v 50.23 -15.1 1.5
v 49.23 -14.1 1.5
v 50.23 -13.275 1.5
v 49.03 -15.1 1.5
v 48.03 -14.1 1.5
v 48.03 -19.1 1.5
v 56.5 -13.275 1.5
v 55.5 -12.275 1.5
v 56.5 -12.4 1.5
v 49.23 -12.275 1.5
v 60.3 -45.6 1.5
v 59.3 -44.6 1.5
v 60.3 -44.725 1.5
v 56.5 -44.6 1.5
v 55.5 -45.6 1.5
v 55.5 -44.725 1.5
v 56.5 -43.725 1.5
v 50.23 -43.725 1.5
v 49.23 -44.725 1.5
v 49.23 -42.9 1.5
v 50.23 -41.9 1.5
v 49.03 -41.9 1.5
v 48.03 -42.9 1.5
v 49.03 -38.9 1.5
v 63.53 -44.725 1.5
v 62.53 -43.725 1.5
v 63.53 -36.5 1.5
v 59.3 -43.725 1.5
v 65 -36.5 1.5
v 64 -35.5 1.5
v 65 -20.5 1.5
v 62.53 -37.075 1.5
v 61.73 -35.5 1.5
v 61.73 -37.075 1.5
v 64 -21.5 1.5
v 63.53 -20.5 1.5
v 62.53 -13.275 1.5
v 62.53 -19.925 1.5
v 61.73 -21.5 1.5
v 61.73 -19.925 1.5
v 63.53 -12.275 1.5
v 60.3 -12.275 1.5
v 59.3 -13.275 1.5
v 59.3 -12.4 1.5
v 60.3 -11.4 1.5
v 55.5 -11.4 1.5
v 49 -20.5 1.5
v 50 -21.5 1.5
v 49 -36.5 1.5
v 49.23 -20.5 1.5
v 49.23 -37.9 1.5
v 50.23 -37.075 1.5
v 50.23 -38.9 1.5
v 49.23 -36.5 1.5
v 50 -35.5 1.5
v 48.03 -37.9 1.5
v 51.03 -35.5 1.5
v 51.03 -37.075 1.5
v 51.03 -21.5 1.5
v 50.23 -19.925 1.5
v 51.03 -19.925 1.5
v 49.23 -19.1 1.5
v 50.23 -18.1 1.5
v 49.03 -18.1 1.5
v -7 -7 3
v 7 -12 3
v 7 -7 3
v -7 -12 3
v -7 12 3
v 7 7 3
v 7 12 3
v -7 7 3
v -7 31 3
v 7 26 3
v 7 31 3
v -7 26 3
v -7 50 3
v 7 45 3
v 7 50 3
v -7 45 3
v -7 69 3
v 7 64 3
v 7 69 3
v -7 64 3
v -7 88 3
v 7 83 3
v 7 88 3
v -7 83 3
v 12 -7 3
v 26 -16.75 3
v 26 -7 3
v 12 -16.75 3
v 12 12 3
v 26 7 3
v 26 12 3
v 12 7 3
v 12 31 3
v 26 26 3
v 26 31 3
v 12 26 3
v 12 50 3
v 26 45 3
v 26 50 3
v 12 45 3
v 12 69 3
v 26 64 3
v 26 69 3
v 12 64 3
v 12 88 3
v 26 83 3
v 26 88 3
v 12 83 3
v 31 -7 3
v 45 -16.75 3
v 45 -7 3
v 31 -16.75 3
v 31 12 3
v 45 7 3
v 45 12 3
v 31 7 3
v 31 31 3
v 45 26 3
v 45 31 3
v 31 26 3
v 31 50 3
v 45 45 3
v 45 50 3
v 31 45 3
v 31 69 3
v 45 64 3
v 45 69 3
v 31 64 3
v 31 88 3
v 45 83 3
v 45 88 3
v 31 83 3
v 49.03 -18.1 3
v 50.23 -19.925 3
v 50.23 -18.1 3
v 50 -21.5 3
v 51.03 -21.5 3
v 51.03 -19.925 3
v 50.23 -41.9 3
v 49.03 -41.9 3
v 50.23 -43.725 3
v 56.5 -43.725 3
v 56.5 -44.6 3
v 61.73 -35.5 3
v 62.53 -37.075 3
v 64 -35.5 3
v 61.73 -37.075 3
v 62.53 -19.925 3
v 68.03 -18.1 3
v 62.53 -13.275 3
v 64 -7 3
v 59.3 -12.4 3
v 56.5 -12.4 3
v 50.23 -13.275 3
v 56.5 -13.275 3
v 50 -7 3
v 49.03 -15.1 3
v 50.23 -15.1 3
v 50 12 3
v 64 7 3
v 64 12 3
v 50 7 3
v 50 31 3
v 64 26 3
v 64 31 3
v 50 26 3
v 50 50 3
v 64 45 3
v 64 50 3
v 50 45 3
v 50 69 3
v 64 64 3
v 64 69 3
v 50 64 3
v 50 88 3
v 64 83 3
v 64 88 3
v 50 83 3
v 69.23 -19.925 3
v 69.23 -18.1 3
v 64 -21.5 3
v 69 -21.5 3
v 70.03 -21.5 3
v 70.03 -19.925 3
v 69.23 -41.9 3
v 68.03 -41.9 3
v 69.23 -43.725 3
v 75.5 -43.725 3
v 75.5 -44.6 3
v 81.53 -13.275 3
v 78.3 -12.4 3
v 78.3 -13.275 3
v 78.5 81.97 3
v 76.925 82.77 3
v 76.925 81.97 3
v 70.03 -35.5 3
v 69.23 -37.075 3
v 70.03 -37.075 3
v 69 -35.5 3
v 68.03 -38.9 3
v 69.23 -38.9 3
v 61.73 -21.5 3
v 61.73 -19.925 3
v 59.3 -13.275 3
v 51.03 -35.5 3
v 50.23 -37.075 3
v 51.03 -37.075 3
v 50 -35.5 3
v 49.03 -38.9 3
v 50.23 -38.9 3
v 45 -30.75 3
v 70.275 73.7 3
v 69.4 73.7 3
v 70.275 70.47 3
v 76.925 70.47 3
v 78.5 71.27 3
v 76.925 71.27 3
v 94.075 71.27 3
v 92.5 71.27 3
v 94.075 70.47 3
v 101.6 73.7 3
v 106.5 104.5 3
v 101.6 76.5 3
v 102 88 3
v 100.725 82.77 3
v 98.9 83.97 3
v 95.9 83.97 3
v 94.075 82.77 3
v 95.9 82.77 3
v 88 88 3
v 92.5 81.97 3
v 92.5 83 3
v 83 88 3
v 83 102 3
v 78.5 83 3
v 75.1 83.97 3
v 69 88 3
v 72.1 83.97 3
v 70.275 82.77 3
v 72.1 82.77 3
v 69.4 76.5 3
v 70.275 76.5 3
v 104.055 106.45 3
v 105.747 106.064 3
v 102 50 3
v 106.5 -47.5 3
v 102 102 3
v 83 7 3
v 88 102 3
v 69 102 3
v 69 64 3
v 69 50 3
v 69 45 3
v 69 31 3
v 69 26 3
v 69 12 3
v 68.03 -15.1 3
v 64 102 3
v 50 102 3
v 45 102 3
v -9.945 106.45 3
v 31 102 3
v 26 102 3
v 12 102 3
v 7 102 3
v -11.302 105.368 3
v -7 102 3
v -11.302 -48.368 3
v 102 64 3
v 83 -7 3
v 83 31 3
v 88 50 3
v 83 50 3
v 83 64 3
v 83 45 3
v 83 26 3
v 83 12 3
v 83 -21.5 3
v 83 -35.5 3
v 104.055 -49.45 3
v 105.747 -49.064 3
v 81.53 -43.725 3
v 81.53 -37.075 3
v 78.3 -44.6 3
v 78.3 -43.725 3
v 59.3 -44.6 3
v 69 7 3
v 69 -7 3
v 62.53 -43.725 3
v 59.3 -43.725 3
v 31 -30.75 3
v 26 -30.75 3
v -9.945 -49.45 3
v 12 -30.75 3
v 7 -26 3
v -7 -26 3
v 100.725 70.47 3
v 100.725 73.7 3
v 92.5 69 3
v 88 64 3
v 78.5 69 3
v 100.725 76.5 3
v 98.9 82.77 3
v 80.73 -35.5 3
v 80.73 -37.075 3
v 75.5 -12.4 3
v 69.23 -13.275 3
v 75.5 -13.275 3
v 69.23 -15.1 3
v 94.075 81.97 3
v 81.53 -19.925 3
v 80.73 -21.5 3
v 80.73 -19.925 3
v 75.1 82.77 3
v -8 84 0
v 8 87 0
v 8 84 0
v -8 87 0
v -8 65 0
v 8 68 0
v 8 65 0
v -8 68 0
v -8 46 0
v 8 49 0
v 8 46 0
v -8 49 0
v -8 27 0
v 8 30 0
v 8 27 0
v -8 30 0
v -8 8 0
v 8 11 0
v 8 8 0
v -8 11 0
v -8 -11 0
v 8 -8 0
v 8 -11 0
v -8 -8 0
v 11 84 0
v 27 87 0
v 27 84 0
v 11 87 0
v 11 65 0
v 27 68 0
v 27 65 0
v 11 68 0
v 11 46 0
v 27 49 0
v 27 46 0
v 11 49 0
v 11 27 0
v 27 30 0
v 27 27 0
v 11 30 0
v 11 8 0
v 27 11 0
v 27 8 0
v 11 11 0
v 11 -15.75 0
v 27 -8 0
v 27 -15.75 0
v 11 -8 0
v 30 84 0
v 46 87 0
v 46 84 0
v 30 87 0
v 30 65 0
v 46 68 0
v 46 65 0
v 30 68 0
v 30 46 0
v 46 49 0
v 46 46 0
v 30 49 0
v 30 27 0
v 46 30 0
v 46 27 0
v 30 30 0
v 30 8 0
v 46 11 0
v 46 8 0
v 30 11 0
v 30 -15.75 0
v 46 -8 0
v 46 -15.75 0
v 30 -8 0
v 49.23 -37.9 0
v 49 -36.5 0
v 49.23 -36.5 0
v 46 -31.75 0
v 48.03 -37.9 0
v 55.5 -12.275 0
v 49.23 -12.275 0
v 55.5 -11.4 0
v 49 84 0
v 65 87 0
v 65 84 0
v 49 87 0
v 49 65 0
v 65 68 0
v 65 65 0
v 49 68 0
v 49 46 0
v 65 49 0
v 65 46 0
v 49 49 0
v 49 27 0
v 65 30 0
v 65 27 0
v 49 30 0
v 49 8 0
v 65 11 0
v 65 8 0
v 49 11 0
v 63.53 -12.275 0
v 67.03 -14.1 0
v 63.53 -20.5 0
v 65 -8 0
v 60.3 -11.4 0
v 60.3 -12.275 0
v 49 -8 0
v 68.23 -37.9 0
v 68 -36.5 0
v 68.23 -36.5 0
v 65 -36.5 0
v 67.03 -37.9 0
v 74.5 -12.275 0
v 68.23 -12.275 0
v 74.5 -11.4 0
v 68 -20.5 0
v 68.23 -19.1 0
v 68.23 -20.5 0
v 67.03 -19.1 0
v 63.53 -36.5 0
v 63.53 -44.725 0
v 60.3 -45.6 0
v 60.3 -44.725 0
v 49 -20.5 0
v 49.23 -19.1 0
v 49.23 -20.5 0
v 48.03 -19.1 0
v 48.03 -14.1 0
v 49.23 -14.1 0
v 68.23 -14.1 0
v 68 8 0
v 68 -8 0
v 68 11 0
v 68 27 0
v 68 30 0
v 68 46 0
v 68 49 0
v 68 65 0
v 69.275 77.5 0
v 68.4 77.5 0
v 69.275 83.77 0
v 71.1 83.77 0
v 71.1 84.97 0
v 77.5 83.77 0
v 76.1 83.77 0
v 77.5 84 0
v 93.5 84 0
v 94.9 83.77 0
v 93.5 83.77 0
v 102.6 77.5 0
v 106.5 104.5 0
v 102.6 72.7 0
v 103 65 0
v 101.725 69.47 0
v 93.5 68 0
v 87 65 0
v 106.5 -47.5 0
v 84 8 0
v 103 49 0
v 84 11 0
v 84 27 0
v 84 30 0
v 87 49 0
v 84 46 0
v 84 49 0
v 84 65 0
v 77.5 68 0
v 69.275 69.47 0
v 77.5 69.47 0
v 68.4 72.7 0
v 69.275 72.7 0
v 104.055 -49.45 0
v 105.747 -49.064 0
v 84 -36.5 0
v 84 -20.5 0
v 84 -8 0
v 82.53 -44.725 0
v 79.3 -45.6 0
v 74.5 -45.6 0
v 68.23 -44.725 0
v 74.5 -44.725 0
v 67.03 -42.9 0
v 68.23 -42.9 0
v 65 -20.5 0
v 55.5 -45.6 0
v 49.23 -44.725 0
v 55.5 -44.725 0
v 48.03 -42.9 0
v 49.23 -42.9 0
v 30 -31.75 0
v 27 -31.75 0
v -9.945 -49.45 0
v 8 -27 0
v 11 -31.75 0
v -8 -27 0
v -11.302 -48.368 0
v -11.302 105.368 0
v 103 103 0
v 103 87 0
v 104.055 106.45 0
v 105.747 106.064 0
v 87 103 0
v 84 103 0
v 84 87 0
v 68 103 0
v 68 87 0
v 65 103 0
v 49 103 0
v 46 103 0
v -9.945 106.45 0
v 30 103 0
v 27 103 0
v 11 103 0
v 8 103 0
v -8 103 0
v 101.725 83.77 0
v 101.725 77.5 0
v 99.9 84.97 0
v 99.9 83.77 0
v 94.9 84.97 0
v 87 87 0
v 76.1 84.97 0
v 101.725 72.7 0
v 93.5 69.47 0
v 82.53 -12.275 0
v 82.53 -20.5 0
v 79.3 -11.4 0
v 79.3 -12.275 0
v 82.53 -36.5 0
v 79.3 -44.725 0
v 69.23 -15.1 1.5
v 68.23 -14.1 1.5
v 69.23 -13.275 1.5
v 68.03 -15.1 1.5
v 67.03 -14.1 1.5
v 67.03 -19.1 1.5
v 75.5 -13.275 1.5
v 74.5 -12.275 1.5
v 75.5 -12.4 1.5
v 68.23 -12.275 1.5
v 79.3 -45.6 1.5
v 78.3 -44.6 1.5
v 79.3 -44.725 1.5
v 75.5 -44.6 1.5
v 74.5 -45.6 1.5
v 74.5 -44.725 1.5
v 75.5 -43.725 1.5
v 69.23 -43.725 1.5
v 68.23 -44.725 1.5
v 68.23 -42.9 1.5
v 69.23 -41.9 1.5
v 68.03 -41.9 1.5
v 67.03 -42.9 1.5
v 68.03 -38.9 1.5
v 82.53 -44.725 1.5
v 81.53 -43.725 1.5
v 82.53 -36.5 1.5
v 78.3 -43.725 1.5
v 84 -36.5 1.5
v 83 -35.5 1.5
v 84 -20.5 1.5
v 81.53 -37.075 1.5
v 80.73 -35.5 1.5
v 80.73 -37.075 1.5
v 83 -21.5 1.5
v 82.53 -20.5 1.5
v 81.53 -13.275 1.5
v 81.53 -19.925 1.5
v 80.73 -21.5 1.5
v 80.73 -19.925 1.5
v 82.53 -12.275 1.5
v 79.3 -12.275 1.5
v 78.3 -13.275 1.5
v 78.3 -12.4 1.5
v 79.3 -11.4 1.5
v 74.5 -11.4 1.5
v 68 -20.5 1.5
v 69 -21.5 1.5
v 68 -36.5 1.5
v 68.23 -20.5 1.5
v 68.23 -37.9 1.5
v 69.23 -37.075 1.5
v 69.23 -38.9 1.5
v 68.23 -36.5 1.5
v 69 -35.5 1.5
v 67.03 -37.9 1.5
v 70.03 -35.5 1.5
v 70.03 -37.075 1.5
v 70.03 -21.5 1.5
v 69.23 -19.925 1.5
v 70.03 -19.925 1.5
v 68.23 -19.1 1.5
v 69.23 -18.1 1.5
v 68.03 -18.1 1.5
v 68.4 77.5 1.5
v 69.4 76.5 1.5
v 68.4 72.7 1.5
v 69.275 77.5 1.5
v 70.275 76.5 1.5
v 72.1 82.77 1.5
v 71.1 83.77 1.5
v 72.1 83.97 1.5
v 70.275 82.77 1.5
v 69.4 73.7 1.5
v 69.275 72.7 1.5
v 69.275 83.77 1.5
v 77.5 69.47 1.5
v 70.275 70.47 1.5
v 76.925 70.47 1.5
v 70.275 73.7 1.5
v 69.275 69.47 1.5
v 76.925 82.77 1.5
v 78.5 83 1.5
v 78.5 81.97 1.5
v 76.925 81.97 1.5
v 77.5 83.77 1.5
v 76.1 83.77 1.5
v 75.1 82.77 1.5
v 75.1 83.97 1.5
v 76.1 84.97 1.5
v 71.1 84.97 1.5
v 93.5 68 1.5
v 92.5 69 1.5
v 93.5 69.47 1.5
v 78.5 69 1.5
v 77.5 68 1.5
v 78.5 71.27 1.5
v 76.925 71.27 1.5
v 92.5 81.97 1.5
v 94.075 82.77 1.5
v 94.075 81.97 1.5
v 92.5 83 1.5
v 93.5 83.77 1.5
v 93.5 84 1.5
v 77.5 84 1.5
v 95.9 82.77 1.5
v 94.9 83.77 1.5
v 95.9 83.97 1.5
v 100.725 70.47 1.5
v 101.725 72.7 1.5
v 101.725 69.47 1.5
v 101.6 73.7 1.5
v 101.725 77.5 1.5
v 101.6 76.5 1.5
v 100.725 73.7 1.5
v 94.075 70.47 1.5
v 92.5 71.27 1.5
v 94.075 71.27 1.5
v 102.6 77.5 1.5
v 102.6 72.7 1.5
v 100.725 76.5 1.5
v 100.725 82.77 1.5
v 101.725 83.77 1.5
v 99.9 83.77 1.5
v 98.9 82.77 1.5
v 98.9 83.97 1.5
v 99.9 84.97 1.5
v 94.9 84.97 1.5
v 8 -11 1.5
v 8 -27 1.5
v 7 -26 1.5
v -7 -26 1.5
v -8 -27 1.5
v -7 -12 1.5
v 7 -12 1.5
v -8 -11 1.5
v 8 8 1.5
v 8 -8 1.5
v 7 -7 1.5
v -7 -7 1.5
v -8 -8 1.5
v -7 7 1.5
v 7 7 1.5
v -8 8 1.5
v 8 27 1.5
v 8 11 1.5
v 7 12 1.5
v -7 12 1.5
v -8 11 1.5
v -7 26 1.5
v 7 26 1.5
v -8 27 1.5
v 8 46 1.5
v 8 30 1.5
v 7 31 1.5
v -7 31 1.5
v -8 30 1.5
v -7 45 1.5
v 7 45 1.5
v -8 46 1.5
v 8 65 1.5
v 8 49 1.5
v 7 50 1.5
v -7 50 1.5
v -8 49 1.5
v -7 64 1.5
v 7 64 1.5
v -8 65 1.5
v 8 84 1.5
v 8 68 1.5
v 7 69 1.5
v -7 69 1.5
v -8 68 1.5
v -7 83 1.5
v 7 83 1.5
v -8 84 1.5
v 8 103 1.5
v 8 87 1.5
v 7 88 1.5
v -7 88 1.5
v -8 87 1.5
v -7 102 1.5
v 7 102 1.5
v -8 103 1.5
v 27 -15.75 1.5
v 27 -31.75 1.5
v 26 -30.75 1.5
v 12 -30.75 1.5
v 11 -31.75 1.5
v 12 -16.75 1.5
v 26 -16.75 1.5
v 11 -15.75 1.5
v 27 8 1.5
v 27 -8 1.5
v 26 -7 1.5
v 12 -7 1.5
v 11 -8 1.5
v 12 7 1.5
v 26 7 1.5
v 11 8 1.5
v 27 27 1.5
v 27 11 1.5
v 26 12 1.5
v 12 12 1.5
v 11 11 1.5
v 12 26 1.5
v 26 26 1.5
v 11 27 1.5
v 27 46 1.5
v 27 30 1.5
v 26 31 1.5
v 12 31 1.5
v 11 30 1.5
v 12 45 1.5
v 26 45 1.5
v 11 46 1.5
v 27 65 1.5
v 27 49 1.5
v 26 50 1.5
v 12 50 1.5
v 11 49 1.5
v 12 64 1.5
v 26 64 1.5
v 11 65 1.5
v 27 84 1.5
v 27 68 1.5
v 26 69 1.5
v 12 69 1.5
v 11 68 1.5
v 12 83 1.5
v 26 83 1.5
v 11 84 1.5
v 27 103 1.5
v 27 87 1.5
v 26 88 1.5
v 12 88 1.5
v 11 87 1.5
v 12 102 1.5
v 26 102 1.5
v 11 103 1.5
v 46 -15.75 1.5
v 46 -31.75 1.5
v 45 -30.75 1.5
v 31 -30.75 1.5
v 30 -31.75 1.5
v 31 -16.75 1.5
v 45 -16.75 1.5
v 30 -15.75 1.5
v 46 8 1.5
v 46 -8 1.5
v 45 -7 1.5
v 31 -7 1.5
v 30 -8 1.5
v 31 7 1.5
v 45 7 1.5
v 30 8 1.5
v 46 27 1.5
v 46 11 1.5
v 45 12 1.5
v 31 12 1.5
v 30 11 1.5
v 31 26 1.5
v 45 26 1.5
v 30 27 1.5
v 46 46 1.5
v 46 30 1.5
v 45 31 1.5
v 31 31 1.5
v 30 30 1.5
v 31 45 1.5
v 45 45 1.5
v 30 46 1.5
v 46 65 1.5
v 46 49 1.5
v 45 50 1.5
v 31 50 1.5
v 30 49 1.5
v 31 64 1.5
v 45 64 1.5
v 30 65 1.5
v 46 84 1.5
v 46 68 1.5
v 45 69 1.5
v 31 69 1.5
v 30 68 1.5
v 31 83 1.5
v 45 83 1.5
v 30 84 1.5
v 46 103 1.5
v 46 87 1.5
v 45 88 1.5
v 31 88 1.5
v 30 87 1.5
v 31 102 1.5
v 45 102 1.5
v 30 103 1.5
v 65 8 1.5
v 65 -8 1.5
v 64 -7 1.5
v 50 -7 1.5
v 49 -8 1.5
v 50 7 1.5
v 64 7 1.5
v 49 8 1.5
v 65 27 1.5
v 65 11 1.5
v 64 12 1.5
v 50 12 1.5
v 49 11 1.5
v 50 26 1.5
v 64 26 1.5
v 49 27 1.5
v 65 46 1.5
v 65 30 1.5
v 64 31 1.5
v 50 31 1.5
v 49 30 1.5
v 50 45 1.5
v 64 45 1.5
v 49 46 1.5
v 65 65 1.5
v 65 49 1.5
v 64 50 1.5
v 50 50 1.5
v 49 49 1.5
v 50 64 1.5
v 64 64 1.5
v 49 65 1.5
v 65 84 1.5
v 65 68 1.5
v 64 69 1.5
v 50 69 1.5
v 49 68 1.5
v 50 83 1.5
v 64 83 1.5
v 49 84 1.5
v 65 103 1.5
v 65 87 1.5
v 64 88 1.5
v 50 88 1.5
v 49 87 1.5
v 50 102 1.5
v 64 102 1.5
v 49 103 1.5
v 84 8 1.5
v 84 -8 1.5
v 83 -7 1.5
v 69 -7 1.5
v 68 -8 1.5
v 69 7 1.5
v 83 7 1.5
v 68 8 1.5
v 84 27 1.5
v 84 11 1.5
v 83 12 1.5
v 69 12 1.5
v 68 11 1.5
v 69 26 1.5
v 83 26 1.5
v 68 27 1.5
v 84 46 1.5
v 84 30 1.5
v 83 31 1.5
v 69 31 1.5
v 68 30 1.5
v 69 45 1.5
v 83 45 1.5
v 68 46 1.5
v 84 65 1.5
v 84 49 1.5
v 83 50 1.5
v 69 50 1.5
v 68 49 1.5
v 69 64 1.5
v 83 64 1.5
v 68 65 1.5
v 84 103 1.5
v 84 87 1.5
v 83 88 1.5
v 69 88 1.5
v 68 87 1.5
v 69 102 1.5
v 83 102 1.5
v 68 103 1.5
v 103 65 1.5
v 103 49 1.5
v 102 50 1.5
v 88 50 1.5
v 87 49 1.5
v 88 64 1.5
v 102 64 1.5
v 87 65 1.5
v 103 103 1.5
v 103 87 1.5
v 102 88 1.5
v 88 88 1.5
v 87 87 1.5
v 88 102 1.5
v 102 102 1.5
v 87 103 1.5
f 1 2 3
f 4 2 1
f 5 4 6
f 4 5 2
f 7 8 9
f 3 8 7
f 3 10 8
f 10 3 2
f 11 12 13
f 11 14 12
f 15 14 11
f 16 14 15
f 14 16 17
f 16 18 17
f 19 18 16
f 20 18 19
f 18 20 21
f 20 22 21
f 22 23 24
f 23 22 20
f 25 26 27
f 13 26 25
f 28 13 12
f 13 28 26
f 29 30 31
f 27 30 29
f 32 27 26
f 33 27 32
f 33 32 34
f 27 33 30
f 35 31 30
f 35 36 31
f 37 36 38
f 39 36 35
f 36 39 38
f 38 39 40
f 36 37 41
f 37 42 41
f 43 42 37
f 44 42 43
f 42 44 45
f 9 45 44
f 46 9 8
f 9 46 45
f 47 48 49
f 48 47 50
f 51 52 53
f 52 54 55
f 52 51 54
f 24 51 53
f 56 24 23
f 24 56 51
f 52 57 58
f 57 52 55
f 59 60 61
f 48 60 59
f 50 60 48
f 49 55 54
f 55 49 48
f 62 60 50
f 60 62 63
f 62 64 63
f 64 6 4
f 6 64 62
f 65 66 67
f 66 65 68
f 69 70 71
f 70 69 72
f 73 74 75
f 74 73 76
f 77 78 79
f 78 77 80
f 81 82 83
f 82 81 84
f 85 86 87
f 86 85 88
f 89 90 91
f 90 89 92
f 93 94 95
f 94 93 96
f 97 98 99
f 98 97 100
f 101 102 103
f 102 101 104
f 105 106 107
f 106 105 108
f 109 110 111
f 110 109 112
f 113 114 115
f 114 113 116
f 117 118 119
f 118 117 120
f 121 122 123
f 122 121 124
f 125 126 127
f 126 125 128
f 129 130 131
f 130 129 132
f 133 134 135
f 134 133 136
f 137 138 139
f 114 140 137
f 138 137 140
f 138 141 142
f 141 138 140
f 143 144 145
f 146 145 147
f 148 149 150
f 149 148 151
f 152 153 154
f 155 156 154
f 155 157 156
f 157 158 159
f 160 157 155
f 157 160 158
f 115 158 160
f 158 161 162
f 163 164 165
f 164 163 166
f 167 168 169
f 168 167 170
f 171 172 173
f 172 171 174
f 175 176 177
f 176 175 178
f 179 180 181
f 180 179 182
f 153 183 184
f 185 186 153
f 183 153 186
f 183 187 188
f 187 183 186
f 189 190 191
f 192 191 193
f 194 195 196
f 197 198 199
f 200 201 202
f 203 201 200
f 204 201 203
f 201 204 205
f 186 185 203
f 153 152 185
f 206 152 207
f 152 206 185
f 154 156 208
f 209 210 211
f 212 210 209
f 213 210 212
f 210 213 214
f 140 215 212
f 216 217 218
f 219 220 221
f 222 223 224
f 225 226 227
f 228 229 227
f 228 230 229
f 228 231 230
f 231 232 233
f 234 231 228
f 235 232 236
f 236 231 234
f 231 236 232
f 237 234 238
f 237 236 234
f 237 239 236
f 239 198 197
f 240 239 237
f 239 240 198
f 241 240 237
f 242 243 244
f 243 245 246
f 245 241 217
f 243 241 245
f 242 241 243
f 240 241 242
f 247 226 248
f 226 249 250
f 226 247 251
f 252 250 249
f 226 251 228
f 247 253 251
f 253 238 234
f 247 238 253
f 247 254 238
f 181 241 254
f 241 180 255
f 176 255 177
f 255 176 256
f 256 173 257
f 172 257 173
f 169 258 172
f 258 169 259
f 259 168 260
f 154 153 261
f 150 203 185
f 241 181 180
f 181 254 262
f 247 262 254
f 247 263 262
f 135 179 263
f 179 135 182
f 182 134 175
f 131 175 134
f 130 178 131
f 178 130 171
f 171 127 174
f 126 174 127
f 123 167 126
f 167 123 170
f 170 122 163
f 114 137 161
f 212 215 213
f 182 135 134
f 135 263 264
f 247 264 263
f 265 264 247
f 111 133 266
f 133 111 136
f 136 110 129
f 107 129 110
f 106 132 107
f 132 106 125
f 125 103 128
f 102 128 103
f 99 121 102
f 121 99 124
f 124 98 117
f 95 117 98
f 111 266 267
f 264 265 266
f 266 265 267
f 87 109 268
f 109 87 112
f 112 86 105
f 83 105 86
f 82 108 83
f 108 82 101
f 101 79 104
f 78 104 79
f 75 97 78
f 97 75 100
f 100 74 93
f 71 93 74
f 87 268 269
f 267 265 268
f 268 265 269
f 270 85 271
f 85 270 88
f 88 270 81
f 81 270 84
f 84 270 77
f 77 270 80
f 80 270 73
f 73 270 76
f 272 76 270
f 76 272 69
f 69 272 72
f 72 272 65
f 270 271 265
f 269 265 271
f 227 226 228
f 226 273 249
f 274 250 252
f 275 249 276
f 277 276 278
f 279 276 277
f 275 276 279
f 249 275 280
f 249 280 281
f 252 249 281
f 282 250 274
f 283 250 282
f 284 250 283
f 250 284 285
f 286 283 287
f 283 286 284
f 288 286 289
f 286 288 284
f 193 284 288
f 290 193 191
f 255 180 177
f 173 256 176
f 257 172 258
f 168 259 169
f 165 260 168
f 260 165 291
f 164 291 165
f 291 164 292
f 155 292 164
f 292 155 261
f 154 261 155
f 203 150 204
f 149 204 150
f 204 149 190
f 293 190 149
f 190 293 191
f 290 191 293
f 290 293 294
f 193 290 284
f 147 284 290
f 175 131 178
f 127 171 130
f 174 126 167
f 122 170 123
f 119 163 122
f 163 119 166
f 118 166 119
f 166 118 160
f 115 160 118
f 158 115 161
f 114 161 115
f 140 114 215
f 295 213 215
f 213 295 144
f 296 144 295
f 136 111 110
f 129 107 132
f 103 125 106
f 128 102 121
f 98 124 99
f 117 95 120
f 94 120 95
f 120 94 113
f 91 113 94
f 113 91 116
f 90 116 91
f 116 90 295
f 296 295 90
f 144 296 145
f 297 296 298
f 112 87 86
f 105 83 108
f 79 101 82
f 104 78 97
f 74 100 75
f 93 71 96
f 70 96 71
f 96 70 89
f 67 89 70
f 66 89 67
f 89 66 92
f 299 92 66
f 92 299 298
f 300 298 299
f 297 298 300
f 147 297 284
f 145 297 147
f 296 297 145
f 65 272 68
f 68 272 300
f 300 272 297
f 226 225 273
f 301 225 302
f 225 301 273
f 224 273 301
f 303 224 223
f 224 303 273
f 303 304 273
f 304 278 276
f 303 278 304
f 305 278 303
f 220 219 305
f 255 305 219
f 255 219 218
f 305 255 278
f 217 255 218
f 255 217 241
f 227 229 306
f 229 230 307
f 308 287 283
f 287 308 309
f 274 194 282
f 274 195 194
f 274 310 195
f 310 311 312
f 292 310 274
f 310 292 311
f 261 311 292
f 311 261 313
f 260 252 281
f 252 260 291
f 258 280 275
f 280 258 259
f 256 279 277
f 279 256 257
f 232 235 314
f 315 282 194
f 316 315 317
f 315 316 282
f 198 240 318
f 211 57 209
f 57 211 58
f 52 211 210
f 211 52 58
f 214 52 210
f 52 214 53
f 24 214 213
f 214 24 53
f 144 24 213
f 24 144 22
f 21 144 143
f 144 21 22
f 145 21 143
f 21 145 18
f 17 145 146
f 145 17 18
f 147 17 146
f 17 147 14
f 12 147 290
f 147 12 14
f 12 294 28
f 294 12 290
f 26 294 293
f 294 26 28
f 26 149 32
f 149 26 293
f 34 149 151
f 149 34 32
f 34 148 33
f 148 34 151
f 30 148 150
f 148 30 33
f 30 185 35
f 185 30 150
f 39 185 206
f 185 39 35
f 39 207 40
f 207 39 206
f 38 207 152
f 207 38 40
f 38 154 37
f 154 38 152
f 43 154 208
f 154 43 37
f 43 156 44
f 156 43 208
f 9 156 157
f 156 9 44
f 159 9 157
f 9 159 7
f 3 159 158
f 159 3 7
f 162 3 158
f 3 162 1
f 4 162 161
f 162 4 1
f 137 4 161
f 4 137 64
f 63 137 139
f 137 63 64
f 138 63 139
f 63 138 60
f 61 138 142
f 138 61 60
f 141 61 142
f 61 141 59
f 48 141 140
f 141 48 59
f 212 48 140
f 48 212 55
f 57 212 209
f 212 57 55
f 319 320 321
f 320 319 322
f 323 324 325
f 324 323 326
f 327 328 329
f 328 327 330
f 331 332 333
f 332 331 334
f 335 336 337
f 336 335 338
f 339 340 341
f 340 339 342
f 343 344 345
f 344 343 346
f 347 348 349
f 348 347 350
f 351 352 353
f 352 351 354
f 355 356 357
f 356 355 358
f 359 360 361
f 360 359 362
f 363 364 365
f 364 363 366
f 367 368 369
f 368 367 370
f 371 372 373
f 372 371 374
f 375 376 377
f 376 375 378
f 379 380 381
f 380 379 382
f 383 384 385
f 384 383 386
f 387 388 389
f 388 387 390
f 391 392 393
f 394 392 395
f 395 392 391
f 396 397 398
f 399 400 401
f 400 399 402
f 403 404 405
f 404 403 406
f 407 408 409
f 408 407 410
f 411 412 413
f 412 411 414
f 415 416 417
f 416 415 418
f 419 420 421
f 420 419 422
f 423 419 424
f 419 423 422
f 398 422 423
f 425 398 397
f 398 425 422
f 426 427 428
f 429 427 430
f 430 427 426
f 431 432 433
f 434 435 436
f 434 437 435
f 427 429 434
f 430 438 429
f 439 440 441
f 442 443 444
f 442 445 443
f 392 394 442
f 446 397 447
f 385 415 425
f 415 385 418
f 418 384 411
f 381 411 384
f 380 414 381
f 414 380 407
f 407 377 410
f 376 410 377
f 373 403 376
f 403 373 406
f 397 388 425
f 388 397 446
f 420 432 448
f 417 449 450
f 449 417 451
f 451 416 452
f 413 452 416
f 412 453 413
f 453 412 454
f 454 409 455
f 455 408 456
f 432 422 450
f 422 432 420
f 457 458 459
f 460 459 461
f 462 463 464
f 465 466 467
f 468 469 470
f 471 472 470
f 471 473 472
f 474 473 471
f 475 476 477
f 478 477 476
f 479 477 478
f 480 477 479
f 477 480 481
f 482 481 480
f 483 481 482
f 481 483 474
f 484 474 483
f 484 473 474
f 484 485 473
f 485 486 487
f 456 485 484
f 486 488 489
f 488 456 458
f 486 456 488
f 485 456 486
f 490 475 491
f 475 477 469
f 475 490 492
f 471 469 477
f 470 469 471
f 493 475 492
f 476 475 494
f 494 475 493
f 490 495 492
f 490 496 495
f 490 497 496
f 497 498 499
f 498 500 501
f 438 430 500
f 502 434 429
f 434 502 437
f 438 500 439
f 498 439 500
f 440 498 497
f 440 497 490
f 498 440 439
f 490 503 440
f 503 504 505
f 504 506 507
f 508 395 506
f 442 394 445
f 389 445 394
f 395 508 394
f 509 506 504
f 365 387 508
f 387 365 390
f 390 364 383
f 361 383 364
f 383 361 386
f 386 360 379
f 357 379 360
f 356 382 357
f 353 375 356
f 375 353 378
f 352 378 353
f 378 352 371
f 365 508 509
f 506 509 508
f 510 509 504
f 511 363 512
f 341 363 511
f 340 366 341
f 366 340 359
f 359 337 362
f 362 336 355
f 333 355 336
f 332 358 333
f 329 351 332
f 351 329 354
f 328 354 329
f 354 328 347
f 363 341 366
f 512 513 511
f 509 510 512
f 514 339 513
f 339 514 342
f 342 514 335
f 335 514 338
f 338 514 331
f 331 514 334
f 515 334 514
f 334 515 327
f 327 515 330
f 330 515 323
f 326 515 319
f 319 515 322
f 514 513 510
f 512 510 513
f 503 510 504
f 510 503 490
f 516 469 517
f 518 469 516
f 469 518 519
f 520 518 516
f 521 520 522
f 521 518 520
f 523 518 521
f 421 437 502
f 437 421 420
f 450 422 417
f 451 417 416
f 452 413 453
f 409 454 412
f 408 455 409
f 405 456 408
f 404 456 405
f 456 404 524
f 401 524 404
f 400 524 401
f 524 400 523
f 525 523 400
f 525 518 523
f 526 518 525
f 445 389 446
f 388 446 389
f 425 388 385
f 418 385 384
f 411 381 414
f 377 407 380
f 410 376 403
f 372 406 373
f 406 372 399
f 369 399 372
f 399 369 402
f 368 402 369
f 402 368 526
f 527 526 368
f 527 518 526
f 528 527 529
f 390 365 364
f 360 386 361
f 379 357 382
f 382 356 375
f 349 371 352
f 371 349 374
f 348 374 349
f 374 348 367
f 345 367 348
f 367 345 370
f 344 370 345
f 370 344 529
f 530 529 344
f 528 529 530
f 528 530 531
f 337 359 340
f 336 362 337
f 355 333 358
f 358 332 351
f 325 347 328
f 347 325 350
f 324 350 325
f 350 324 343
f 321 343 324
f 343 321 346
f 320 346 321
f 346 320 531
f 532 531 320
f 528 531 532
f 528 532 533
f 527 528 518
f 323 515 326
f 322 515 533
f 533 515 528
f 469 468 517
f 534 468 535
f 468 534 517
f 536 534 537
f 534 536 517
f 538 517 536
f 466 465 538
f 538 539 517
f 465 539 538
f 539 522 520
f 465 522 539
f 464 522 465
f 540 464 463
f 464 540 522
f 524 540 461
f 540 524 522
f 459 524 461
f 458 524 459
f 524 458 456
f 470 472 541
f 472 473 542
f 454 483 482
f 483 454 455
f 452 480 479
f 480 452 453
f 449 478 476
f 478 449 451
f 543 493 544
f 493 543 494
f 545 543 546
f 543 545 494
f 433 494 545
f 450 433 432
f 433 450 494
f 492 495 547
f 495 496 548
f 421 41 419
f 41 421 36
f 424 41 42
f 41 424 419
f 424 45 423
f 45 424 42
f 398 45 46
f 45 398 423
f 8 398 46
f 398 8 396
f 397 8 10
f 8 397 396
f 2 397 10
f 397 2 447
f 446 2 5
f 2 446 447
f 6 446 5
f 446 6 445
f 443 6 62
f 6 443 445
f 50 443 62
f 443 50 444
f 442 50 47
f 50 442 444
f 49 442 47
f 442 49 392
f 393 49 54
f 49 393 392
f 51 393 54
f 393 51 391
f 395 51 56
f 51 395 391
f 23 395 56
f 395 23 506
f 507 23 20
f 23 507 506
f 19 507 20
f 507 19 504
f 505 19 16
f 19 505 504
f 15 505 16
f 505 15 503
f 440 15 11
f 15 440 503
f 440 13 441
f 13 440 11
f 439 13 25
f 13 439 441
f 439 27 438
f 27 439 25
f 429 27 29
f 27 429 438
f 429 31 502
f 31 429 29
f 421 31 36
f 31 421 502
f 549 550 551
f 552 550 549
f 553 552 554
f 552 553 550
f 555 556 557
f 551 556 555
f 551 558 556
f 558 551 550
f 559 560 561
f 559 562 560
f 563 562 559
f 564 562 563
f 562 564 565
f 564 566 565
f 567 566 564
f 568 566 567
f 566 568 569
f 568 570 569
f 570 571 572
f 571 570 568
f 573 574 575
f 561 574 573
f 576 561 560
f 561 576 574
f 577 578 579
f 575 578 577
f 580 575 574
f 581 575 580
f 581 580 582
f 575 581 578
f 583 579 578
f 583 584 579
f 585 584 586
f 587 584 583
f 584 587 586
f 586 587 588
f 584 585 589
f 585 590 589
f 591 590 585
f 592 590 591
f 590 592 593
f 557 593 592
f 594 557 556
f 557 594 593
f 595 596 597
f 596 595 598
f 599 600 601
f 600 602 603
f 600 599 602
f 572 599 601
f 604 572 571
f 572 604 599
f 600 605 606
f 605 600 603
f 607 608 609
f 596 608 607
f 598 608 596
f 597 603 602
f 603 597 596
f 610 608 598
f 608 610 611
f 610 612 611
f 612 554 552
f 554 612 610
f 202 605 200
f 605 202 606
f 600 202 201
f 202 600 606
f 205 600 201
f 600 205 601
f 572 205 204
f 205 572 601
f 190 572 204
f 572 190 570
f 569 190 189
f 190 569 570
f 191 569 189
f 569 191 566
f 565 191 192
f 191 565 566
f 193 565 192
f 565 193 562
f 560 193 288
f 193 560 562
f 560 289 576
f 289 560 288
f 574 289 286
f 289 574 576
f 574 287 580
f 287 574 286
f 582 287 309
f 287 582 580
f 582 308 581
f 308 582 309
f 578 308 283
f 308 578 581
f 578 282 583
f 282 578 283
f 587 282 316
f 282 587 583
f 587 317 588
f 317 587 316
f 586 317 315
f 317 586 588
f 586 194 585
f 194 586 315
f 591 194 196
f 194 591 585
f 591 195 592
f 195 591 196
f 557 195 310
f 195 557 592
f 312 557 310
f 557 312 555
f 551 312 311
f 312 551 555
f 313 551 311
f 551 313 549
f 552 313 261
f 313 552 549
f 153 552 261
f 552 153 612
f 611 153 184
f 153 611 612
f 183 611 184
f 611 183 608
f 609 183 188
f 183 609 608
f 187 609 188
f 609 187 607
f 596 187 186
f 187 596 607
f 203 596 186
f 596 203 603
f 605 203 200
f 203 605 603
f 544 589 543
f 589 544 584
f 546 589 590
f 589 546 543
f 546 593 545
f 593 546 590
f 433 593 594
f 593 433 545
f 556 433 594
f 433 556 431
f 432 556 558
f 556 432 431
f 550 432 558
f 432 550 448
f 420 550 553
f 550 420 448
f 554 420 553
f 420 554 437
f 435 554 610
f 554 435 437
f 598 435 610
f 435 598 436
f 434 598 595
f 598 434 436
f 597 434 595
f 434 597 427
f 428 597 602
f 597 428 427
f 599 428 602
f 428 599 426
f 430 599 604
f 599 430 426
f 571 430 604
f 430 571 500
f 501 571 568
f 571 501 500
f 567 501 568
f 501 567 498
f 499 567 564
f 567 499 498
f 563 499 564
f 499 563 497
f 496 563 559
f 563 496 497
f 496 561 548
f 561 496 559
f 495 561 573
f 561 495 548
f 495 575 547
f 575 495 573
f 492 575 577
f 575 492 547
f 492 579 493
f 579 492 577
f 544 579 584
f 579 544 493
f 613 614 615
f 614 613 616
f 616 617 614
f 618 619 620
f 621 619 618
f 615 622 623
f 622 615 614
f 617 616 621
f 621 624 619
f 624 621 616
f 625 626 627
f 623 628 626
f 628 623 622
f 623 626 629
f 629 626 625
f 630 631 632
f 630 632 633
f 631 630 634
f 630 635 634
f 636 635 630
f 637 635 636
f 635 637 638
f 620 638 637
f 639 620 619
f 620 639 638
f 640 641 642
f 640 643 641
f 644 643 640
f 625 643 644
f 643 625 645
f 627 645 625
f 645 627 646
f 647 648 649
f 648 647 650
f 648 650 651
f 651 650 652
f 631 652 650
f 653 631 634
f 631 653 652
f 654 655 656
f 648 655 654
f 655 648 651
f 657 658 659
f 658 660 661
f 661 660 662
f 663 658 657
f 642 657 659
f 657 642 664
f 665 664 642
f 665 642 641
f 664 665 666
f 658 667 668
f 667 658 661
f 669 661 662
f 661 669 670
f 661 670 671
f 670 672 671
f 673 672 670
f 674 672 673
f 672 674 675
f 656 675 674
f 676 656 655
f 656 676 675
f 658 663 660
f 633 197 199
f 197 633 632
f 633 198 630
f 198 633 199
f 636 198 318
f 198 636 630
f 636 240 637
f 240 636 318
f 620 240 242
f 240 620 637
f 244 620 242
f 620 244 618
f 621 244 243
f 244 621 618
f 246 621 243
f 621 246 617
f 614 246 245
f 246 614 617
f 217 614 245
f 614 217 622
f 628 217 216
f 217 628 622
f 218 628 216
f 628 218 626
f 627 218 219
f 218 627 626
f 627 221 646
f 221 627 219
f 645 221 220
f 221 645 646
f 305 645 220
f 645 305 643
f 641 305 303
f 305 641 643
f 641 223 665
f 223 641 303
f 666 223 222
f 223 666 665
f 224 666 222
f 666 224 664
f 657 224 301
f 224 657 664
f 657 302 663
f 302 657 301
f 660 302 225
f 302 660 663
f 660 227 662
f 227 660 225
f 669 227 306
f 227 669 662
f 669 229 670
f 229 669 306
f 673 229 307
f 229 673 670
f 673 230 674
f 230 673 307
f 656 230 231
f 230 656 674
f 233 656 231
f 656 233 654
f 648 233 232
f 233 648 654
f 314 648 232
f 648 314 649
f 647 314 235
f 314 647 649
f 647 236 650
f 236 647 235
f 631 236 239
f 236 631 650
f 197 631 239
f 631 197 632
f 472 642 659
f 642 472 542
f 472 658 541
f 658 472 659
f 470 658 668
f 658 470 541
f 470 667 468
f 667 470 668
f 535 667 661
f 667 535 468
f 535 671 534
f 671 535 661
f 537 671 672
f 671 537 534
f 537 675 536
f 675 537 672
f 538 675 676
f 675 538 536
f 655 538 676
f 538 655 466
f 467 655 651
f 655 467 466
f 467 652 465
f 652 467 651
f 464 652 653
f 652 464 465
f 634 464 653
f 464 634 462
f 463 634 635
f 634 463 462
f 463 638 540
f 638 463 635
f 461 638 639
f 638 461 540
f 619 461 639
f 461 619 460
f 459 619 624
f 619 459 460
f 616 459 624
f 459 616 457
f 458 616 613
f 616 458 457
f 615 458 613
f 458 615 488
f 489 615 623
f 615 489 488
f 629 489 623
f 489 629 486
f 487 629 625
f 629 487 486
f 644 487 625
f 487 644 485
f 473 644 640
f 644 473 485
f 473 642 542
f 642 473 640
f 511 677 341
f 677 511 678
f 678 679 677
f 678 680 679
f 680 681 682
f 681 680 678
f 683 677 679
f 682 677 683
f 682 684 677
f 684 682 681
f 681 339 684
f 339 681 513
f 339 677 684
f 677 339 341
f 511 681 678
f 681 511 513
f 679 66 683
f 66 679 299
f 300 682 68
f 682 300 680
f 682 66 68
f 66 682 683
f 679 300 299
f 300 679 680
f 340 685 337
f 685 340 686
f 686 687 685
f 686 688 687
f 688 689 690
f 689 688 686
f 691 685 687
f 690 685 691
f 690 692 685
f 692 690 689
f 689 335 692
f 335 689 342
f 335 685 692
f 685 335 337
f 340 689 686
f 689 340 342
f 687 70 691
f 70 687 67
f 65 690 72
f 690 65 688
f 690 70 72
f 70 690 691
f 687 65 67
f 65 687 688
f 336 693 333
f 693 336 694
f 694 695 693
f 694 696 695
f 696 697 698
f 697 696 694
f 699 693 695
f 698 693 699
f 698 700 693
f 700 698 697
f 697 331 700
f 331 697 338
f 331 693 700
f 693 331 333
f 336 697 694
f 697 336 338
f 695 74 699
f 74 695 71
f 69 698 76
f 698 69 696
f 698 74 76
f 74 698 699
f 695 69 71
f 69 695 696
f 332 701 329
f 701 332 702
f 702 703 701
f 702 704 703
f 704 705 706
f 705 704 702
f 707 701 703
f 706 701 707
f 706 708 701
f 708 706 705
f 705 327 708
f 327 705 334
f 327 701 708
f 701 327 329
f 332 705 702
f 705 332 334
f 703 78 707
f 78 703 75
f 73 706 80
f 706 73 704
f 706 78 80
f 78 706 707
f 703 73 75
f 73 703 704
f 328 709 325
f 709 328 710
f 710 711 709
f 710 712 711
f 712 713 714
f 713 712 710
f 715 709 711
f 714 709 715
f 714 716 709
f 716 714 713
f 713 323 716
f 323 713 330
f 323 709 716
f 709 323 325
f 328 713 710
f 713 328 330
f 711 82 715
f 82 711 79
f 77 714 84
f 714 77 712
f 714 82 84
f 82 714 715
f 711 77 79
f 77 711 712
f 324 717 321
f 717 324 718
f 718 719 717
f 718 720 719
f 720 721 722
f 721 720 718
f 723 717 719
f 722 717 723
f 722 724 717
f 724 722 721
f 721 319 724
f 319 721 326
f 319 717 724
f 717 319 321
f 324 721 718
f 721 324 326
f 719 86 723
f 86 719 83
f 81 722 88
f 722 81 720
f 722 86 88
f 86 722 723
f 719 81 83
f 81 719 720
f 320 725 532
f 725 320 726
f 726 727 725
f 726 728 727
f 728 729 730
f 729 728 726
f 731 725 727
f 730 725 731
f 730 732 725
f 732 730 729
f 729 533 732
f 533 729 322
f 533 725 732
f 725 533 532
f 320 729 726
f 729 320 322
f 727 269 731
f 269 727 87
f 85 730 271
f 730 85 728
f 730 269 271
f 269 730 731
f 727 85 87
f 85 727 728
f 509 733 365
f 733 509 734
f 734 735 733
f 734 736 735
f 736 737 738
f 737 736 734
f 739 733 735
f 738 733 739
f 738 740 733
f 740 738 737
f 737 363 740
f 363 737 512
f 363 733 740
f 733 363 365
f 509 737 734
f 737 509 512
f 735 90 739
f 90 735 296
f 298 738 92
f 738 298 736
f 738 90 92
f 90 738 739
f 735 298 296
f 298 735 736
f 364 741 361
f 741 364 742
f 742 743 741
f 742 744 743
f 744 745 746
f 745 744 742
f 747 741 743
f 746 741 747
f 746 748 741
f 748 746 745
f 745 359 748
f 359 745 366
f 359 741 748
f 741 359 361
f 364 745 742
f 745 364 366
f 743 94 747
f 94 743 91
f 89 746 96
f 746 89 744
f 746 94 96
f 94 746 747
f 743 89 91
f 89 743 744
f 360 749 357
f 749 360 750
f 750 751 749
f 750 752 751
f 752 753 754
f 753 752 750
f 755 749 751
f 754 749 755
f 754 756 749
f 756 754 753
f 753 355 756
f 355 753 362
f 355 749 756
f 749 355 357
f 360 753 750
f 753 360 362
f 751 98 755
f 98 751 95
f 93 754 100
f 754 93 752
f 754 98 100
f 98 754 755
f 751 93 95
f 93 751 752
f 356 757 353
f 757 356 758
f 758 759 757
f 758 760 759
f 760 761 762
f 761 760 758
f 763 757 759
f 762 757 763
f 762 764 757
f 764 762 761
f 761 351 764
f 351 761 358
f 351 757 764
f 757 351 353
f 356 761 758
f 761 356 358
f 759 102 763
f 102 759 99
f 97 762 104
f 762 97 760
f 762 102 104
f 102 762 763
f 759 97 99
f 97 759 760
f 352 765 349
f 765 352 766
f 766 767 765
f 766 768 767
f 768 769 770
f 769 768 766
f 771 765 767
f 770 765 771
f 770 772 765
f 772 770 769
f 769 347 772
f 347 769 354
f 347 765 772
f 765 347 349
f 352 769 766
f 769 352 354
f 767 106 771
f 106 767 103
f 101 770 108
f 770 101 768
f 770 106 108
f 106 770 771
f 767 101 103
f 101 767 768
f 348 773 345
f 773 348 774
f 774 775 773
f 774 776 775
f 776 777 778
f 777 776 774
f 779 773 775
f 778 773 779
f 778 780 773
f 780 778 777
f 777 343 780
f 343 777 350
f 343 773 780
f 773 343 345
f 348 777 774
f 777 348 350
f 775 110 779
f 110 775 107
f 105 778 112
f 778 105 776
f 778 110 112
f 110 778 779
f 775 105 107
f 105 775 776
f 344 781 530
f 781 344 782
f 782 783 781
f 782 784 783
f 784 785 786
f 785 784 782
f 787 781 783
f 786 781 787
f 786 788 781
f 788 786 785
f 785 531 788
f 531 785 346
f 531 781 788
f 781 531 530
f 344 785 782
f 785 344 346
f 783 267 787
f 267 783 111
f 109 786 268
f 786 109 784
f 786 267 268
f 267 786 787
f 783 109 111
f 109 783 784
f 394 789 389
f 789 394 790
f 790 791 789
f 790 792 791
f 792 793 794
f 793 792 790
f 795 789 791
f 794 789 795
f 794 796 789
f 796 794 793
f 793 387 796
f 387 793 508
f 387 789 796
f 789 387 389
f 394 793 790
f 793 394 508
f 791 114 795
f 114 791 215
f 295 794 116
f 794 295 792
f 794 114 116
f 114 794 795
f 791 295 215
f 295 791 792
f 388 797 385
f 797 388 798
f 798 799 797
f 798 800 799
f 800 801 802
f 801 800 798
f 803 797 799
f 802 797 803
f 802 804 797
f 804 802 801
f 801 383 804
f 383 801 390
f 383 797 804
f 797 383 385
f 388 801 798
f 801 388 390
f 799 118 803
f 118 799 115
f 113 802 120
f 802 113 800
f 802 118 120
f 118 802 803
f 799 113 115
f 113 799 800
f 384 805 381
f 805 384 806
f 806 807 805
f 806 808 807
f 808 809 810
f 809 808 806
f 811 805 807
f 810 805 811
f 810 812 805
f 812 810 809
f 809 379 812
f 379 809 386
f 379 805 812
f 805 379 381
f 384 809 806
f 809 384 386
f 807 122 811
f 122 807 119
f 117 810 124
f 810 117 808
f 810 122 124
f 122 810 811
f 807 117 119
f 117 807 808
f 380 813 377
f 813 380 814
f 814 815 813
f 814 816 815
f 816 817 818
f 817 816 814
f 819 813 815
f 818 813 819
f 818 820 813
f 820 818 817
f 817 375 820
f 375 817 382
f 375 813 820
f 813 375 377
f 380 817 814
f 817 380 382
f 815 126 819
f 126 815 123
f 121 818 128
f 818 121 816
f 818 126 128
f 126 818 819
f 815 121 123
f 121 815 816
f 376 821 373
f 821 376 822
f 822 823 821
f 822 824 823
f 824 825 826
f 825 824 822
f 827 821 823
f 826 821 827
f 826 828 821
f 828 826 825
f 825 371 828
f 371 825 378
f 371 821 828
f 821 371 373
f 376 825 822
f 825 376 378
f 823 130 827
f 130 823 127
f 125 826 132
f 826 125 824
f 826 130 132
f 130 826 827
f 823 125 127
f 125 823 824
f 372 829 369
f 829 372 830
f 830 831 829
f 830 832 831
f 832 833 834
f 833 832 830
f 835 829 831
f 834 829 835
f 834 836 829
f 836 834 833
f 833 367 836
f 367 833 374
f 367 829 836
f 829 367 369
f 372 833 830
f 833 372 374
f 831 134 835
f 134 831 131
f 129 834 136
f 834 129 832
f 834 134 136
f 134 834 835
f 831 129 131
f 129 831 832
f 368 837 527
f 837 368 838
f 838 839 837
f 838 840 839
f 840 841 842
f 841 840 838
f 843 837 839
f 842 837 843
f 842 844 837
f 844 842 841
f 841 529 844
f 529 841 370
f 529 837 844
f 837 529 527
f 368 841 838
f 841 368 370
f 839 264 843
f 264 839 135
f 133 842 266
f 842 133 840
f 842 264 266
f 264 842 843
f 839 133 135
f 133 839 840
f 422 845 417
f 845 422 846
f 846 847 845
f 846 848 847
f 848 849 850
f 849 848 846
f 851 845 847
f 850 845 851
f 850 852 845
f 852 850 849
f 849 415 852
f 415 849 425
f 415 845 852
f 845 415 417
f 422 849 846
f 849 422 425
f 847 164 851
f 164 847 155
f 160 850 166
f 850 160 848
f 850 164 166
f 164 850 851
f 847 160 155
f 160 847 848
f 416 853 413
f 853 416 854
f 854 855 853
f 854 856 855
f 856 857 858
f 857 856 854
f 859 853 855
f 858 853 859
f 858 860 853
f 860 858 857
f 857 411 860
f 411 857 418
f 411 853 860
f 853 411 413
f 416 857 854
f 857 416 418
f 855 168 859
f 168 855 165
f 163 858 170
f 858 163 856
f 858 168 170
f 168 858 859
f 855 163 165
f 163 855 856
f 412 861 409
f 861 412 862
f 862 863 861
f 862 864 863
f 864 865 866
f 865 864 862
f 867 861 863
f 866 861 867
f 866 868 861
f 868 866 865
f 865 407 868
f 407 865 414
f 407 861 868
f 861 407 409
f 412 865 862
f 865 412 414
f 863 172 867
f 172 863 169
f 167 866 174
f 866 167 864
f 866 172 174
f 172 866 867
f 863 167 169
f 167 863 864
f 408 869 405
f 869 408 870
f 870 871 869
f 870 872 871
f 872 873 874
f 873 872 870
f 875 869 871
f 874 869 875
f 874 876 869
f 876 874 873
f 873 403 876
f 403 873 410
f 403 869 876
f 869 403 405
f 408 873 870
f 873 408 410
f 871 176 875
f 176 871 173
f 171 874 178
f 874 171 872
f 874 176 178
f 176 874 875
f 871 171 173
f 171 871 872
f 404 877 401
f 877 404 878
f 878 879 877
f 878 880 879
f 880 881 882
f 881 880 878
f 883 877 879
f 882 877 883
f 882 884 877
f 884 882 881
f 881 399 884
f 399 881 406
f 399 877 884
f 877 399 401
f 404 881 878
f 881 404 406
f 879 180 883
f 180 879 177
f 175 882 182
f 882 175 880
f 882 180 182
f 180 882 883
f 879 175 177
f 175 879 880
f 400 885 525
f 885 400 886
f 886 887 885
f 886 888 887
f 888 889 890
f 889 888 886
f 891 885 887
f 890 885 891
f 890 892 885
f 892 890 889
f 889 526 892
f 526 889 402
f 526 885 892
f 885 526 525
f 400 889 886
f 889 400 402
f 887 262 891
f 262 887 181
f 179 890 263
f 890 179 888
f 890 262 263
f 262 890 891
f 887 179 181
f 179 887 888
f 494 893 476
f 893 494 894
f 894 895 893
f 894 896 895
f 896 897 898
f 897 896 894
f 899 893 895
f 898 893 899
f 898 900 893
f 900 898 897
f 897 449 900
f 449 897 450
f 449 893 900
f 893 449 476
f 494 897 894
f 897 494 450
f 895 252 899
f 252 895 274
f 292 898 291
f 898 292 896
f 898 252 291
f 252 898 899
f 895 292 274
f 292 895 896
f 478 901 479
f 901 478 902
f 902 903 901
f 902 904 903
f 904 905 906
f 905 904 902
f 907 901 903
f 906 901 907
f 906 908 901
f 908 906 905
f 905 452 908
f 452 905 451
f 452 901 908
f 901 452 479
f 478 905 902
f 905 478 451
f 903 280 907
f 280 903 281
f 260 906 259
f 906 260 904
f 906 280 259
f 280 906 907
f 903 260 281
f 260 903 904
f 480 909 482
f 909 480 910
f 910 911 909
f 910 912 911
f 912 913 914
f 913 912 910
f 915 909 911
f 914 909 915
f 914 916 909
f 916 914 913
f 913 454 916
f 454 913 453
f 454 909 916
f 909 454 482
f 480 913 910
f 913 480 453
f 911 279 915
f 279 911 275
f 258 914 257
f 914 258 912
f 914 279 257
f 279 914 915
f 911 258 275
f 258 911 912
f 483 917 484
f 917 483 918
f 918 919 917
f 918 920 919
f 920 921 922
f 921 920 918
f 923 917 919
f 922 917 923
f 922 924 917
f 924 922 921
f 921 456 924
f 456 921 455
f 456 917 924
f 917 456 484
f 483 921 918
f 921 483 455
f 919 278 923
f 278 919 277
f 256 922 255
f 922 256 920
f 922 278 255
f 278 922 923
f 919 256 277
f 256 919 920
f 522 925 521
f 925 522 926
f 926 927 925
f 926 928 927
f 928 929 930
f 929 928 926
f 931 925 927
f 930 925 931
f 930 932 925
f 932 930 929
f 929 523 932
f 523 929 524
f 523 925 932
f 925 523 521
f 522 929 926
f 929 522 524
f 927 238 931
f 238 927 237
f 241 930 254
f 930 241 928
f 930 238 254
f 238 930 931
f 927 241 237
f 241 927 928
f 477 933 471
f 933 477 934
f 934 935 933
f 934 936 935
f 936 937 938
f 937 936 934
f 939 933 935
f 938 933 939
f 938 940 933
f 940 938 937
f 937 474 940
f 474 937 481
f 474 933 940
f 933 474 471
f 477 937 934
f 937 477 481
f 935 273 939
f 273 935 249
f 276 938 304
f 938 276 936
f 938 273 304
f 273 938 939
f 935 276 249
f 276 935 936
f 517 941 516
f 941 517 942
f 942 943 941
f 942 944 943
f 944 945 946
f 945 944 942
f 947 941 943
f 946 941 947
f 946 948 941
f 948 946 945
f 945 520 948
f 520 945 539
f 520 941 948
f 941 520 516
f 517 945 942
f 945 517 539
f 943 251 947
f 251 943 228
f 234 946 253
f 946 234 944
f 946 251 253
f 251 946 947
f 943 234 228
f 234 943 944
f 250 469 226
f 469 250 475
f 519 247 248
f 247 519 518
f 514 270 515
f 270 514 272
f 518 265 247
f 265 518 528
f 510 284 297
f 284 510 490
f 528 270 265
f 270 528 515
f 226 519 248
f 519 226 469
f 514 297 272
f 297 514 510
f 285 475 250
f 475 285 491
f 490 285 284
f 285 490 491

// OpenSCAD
slop = 0.0;
switch_x = 14 + slop;
switch_y = switch_x;
rounding = 2;

plate_thickness = 3;

//clip_thickness = 1.524 + slop; //mx
clip_thickness = 1.5 + slop; //gateron

outer_padding = 5;
hole_size = 4;

case_height=12;

pitch = 19;
u = pitch;

switch_positions = [
                    //row1
                    [0,-1*u,0],
                    [0,0,0],
                    [0,1*u,0],
                    [0,2*u,0],
                    [0,3*u,0],
                    [0,4*u,0],
                    [0,5*u,0],
                    //row2
                    [1*u,-1.25*u,0],
                    [1*u,0,0],
                    [1*u,1*u,0],
                    [1*u,2*u,0],
                    [1*u,3*u,0],
                    [1*u,4*u,0],
                    [1*u,5*u,0],

                    //row3
                    [2*u,-1.25*u,0],
                    [2*u,0,0],
                    [2*u,1*u,0],
                    [2*u,2*u,0],
                    [2*u,3*u,0],
                    [2*u,4*u,0],
                    [2*u,5*u,0],

                    //row4
                    [3*u,0,0],
                    [3*u,1*u,0],
                    [3*u,2*u,0],
                    [3*u,3*u,0],
                    [3*u,4*u,0],
                    [3*u,5*u,0],

                    //row5
                    [4*u,0,0],
                    [4*u,1*u,0],
                    [4*u,2*u,0],
                    [4*u,3*u,0],
                    //2u stab key rotated
                    [4*u,5*u,0],

                    //row5
                    [5*u,3*u,0],
                    //2u stab key rotated
                    [5*u,5*u,0],
                    ];

2u_stabilised_switch_positions = [
                    [3*u,-1.5*u,0],
                    [4*u,-1.5*u,0],
                    ];

module switch_hole(position){
    translate(position)
    translate([0,0,(plate_thickness-clip_thickness)/2])
    union(){
        //clip
        cube([switch_x+2, switch_y+2, plate_thickness-clip_thickness],center=true);
        //rim
        translate([0,0,plate_thickness-clip_thickness])cube([switch_x, switch_y, clip_thickness],center=true);
    }
}

module 2u_stabilised_key_hole(position){
    points = [
        [-0.50,32.2/2],
        [2.3,32.2/2],
        [2.3,30.45/2],
        [5.53,30.45/2],
        [5.53,17.15/2],
        [4.73,17.15/2],
        [4.73,14/2],
        [7,14/2],
        [7,0],

        [-7,0],
        [-7,14/2],
        [-5.97,14/2],
        [-5.97,17.15/2],
        [-6.77,17.15/2],
        [-6.77,20.80/2],
        [-7.97,20.80/2],
        [-7.97,26.80/2],
        [-6.77,26.80/2],
        [-6.77,30.45/2],
        [-0.5,30.45/2]
    ];

    translate(position)
    union(){
        //clip
        translate([0,0,plate_thickness-(clip_thickness/2)])
        linear_extrude(clip_thickness,center=true)
        union(){
            rotate([180,0,0])polygon(points);
            polygon(points);
        }

        //rim
        translate([0,0,(plate_thickness-clip_thickness)/2])
        linear_extrude(plate_thickness-clip_thickness,center=true)
        union(){
            rotate([180,0,0])offset(delta=1){polygon(points);}
            offset(delta=1){polygon(points);}
        }
    }

}

module plate_gen(){
    points = [
        [-.5*u,-2.5*u,0],
        [-.5*u,5.5*u,0],
        [5.5*u,5.5*u,0],
        [5.5*u,-2.5*u,0],
        ];
    hull(){
    for(i=points){
        translate(i)cylinder(r1=rounding, r2=rounding, h=plate_thickness);
    }
    }
}
difference(){
    //plate
    plate_gen();
    // cutouts for switches and stabs
    union(){
        //stabs from position list
        for(i=2u_stabilised_switch_positions){
            2u_stabilised_key_hole(i);
        }
        //custom positioned (rotated) stabs
        translate([.5*u,7.5*u,0])rotate([180,180,90])
        2u_stabilised_key_hole([3.5*u,4*u,0]);

        for(i=switch_positions){
            switch_hole(i);
        }
    }
}
